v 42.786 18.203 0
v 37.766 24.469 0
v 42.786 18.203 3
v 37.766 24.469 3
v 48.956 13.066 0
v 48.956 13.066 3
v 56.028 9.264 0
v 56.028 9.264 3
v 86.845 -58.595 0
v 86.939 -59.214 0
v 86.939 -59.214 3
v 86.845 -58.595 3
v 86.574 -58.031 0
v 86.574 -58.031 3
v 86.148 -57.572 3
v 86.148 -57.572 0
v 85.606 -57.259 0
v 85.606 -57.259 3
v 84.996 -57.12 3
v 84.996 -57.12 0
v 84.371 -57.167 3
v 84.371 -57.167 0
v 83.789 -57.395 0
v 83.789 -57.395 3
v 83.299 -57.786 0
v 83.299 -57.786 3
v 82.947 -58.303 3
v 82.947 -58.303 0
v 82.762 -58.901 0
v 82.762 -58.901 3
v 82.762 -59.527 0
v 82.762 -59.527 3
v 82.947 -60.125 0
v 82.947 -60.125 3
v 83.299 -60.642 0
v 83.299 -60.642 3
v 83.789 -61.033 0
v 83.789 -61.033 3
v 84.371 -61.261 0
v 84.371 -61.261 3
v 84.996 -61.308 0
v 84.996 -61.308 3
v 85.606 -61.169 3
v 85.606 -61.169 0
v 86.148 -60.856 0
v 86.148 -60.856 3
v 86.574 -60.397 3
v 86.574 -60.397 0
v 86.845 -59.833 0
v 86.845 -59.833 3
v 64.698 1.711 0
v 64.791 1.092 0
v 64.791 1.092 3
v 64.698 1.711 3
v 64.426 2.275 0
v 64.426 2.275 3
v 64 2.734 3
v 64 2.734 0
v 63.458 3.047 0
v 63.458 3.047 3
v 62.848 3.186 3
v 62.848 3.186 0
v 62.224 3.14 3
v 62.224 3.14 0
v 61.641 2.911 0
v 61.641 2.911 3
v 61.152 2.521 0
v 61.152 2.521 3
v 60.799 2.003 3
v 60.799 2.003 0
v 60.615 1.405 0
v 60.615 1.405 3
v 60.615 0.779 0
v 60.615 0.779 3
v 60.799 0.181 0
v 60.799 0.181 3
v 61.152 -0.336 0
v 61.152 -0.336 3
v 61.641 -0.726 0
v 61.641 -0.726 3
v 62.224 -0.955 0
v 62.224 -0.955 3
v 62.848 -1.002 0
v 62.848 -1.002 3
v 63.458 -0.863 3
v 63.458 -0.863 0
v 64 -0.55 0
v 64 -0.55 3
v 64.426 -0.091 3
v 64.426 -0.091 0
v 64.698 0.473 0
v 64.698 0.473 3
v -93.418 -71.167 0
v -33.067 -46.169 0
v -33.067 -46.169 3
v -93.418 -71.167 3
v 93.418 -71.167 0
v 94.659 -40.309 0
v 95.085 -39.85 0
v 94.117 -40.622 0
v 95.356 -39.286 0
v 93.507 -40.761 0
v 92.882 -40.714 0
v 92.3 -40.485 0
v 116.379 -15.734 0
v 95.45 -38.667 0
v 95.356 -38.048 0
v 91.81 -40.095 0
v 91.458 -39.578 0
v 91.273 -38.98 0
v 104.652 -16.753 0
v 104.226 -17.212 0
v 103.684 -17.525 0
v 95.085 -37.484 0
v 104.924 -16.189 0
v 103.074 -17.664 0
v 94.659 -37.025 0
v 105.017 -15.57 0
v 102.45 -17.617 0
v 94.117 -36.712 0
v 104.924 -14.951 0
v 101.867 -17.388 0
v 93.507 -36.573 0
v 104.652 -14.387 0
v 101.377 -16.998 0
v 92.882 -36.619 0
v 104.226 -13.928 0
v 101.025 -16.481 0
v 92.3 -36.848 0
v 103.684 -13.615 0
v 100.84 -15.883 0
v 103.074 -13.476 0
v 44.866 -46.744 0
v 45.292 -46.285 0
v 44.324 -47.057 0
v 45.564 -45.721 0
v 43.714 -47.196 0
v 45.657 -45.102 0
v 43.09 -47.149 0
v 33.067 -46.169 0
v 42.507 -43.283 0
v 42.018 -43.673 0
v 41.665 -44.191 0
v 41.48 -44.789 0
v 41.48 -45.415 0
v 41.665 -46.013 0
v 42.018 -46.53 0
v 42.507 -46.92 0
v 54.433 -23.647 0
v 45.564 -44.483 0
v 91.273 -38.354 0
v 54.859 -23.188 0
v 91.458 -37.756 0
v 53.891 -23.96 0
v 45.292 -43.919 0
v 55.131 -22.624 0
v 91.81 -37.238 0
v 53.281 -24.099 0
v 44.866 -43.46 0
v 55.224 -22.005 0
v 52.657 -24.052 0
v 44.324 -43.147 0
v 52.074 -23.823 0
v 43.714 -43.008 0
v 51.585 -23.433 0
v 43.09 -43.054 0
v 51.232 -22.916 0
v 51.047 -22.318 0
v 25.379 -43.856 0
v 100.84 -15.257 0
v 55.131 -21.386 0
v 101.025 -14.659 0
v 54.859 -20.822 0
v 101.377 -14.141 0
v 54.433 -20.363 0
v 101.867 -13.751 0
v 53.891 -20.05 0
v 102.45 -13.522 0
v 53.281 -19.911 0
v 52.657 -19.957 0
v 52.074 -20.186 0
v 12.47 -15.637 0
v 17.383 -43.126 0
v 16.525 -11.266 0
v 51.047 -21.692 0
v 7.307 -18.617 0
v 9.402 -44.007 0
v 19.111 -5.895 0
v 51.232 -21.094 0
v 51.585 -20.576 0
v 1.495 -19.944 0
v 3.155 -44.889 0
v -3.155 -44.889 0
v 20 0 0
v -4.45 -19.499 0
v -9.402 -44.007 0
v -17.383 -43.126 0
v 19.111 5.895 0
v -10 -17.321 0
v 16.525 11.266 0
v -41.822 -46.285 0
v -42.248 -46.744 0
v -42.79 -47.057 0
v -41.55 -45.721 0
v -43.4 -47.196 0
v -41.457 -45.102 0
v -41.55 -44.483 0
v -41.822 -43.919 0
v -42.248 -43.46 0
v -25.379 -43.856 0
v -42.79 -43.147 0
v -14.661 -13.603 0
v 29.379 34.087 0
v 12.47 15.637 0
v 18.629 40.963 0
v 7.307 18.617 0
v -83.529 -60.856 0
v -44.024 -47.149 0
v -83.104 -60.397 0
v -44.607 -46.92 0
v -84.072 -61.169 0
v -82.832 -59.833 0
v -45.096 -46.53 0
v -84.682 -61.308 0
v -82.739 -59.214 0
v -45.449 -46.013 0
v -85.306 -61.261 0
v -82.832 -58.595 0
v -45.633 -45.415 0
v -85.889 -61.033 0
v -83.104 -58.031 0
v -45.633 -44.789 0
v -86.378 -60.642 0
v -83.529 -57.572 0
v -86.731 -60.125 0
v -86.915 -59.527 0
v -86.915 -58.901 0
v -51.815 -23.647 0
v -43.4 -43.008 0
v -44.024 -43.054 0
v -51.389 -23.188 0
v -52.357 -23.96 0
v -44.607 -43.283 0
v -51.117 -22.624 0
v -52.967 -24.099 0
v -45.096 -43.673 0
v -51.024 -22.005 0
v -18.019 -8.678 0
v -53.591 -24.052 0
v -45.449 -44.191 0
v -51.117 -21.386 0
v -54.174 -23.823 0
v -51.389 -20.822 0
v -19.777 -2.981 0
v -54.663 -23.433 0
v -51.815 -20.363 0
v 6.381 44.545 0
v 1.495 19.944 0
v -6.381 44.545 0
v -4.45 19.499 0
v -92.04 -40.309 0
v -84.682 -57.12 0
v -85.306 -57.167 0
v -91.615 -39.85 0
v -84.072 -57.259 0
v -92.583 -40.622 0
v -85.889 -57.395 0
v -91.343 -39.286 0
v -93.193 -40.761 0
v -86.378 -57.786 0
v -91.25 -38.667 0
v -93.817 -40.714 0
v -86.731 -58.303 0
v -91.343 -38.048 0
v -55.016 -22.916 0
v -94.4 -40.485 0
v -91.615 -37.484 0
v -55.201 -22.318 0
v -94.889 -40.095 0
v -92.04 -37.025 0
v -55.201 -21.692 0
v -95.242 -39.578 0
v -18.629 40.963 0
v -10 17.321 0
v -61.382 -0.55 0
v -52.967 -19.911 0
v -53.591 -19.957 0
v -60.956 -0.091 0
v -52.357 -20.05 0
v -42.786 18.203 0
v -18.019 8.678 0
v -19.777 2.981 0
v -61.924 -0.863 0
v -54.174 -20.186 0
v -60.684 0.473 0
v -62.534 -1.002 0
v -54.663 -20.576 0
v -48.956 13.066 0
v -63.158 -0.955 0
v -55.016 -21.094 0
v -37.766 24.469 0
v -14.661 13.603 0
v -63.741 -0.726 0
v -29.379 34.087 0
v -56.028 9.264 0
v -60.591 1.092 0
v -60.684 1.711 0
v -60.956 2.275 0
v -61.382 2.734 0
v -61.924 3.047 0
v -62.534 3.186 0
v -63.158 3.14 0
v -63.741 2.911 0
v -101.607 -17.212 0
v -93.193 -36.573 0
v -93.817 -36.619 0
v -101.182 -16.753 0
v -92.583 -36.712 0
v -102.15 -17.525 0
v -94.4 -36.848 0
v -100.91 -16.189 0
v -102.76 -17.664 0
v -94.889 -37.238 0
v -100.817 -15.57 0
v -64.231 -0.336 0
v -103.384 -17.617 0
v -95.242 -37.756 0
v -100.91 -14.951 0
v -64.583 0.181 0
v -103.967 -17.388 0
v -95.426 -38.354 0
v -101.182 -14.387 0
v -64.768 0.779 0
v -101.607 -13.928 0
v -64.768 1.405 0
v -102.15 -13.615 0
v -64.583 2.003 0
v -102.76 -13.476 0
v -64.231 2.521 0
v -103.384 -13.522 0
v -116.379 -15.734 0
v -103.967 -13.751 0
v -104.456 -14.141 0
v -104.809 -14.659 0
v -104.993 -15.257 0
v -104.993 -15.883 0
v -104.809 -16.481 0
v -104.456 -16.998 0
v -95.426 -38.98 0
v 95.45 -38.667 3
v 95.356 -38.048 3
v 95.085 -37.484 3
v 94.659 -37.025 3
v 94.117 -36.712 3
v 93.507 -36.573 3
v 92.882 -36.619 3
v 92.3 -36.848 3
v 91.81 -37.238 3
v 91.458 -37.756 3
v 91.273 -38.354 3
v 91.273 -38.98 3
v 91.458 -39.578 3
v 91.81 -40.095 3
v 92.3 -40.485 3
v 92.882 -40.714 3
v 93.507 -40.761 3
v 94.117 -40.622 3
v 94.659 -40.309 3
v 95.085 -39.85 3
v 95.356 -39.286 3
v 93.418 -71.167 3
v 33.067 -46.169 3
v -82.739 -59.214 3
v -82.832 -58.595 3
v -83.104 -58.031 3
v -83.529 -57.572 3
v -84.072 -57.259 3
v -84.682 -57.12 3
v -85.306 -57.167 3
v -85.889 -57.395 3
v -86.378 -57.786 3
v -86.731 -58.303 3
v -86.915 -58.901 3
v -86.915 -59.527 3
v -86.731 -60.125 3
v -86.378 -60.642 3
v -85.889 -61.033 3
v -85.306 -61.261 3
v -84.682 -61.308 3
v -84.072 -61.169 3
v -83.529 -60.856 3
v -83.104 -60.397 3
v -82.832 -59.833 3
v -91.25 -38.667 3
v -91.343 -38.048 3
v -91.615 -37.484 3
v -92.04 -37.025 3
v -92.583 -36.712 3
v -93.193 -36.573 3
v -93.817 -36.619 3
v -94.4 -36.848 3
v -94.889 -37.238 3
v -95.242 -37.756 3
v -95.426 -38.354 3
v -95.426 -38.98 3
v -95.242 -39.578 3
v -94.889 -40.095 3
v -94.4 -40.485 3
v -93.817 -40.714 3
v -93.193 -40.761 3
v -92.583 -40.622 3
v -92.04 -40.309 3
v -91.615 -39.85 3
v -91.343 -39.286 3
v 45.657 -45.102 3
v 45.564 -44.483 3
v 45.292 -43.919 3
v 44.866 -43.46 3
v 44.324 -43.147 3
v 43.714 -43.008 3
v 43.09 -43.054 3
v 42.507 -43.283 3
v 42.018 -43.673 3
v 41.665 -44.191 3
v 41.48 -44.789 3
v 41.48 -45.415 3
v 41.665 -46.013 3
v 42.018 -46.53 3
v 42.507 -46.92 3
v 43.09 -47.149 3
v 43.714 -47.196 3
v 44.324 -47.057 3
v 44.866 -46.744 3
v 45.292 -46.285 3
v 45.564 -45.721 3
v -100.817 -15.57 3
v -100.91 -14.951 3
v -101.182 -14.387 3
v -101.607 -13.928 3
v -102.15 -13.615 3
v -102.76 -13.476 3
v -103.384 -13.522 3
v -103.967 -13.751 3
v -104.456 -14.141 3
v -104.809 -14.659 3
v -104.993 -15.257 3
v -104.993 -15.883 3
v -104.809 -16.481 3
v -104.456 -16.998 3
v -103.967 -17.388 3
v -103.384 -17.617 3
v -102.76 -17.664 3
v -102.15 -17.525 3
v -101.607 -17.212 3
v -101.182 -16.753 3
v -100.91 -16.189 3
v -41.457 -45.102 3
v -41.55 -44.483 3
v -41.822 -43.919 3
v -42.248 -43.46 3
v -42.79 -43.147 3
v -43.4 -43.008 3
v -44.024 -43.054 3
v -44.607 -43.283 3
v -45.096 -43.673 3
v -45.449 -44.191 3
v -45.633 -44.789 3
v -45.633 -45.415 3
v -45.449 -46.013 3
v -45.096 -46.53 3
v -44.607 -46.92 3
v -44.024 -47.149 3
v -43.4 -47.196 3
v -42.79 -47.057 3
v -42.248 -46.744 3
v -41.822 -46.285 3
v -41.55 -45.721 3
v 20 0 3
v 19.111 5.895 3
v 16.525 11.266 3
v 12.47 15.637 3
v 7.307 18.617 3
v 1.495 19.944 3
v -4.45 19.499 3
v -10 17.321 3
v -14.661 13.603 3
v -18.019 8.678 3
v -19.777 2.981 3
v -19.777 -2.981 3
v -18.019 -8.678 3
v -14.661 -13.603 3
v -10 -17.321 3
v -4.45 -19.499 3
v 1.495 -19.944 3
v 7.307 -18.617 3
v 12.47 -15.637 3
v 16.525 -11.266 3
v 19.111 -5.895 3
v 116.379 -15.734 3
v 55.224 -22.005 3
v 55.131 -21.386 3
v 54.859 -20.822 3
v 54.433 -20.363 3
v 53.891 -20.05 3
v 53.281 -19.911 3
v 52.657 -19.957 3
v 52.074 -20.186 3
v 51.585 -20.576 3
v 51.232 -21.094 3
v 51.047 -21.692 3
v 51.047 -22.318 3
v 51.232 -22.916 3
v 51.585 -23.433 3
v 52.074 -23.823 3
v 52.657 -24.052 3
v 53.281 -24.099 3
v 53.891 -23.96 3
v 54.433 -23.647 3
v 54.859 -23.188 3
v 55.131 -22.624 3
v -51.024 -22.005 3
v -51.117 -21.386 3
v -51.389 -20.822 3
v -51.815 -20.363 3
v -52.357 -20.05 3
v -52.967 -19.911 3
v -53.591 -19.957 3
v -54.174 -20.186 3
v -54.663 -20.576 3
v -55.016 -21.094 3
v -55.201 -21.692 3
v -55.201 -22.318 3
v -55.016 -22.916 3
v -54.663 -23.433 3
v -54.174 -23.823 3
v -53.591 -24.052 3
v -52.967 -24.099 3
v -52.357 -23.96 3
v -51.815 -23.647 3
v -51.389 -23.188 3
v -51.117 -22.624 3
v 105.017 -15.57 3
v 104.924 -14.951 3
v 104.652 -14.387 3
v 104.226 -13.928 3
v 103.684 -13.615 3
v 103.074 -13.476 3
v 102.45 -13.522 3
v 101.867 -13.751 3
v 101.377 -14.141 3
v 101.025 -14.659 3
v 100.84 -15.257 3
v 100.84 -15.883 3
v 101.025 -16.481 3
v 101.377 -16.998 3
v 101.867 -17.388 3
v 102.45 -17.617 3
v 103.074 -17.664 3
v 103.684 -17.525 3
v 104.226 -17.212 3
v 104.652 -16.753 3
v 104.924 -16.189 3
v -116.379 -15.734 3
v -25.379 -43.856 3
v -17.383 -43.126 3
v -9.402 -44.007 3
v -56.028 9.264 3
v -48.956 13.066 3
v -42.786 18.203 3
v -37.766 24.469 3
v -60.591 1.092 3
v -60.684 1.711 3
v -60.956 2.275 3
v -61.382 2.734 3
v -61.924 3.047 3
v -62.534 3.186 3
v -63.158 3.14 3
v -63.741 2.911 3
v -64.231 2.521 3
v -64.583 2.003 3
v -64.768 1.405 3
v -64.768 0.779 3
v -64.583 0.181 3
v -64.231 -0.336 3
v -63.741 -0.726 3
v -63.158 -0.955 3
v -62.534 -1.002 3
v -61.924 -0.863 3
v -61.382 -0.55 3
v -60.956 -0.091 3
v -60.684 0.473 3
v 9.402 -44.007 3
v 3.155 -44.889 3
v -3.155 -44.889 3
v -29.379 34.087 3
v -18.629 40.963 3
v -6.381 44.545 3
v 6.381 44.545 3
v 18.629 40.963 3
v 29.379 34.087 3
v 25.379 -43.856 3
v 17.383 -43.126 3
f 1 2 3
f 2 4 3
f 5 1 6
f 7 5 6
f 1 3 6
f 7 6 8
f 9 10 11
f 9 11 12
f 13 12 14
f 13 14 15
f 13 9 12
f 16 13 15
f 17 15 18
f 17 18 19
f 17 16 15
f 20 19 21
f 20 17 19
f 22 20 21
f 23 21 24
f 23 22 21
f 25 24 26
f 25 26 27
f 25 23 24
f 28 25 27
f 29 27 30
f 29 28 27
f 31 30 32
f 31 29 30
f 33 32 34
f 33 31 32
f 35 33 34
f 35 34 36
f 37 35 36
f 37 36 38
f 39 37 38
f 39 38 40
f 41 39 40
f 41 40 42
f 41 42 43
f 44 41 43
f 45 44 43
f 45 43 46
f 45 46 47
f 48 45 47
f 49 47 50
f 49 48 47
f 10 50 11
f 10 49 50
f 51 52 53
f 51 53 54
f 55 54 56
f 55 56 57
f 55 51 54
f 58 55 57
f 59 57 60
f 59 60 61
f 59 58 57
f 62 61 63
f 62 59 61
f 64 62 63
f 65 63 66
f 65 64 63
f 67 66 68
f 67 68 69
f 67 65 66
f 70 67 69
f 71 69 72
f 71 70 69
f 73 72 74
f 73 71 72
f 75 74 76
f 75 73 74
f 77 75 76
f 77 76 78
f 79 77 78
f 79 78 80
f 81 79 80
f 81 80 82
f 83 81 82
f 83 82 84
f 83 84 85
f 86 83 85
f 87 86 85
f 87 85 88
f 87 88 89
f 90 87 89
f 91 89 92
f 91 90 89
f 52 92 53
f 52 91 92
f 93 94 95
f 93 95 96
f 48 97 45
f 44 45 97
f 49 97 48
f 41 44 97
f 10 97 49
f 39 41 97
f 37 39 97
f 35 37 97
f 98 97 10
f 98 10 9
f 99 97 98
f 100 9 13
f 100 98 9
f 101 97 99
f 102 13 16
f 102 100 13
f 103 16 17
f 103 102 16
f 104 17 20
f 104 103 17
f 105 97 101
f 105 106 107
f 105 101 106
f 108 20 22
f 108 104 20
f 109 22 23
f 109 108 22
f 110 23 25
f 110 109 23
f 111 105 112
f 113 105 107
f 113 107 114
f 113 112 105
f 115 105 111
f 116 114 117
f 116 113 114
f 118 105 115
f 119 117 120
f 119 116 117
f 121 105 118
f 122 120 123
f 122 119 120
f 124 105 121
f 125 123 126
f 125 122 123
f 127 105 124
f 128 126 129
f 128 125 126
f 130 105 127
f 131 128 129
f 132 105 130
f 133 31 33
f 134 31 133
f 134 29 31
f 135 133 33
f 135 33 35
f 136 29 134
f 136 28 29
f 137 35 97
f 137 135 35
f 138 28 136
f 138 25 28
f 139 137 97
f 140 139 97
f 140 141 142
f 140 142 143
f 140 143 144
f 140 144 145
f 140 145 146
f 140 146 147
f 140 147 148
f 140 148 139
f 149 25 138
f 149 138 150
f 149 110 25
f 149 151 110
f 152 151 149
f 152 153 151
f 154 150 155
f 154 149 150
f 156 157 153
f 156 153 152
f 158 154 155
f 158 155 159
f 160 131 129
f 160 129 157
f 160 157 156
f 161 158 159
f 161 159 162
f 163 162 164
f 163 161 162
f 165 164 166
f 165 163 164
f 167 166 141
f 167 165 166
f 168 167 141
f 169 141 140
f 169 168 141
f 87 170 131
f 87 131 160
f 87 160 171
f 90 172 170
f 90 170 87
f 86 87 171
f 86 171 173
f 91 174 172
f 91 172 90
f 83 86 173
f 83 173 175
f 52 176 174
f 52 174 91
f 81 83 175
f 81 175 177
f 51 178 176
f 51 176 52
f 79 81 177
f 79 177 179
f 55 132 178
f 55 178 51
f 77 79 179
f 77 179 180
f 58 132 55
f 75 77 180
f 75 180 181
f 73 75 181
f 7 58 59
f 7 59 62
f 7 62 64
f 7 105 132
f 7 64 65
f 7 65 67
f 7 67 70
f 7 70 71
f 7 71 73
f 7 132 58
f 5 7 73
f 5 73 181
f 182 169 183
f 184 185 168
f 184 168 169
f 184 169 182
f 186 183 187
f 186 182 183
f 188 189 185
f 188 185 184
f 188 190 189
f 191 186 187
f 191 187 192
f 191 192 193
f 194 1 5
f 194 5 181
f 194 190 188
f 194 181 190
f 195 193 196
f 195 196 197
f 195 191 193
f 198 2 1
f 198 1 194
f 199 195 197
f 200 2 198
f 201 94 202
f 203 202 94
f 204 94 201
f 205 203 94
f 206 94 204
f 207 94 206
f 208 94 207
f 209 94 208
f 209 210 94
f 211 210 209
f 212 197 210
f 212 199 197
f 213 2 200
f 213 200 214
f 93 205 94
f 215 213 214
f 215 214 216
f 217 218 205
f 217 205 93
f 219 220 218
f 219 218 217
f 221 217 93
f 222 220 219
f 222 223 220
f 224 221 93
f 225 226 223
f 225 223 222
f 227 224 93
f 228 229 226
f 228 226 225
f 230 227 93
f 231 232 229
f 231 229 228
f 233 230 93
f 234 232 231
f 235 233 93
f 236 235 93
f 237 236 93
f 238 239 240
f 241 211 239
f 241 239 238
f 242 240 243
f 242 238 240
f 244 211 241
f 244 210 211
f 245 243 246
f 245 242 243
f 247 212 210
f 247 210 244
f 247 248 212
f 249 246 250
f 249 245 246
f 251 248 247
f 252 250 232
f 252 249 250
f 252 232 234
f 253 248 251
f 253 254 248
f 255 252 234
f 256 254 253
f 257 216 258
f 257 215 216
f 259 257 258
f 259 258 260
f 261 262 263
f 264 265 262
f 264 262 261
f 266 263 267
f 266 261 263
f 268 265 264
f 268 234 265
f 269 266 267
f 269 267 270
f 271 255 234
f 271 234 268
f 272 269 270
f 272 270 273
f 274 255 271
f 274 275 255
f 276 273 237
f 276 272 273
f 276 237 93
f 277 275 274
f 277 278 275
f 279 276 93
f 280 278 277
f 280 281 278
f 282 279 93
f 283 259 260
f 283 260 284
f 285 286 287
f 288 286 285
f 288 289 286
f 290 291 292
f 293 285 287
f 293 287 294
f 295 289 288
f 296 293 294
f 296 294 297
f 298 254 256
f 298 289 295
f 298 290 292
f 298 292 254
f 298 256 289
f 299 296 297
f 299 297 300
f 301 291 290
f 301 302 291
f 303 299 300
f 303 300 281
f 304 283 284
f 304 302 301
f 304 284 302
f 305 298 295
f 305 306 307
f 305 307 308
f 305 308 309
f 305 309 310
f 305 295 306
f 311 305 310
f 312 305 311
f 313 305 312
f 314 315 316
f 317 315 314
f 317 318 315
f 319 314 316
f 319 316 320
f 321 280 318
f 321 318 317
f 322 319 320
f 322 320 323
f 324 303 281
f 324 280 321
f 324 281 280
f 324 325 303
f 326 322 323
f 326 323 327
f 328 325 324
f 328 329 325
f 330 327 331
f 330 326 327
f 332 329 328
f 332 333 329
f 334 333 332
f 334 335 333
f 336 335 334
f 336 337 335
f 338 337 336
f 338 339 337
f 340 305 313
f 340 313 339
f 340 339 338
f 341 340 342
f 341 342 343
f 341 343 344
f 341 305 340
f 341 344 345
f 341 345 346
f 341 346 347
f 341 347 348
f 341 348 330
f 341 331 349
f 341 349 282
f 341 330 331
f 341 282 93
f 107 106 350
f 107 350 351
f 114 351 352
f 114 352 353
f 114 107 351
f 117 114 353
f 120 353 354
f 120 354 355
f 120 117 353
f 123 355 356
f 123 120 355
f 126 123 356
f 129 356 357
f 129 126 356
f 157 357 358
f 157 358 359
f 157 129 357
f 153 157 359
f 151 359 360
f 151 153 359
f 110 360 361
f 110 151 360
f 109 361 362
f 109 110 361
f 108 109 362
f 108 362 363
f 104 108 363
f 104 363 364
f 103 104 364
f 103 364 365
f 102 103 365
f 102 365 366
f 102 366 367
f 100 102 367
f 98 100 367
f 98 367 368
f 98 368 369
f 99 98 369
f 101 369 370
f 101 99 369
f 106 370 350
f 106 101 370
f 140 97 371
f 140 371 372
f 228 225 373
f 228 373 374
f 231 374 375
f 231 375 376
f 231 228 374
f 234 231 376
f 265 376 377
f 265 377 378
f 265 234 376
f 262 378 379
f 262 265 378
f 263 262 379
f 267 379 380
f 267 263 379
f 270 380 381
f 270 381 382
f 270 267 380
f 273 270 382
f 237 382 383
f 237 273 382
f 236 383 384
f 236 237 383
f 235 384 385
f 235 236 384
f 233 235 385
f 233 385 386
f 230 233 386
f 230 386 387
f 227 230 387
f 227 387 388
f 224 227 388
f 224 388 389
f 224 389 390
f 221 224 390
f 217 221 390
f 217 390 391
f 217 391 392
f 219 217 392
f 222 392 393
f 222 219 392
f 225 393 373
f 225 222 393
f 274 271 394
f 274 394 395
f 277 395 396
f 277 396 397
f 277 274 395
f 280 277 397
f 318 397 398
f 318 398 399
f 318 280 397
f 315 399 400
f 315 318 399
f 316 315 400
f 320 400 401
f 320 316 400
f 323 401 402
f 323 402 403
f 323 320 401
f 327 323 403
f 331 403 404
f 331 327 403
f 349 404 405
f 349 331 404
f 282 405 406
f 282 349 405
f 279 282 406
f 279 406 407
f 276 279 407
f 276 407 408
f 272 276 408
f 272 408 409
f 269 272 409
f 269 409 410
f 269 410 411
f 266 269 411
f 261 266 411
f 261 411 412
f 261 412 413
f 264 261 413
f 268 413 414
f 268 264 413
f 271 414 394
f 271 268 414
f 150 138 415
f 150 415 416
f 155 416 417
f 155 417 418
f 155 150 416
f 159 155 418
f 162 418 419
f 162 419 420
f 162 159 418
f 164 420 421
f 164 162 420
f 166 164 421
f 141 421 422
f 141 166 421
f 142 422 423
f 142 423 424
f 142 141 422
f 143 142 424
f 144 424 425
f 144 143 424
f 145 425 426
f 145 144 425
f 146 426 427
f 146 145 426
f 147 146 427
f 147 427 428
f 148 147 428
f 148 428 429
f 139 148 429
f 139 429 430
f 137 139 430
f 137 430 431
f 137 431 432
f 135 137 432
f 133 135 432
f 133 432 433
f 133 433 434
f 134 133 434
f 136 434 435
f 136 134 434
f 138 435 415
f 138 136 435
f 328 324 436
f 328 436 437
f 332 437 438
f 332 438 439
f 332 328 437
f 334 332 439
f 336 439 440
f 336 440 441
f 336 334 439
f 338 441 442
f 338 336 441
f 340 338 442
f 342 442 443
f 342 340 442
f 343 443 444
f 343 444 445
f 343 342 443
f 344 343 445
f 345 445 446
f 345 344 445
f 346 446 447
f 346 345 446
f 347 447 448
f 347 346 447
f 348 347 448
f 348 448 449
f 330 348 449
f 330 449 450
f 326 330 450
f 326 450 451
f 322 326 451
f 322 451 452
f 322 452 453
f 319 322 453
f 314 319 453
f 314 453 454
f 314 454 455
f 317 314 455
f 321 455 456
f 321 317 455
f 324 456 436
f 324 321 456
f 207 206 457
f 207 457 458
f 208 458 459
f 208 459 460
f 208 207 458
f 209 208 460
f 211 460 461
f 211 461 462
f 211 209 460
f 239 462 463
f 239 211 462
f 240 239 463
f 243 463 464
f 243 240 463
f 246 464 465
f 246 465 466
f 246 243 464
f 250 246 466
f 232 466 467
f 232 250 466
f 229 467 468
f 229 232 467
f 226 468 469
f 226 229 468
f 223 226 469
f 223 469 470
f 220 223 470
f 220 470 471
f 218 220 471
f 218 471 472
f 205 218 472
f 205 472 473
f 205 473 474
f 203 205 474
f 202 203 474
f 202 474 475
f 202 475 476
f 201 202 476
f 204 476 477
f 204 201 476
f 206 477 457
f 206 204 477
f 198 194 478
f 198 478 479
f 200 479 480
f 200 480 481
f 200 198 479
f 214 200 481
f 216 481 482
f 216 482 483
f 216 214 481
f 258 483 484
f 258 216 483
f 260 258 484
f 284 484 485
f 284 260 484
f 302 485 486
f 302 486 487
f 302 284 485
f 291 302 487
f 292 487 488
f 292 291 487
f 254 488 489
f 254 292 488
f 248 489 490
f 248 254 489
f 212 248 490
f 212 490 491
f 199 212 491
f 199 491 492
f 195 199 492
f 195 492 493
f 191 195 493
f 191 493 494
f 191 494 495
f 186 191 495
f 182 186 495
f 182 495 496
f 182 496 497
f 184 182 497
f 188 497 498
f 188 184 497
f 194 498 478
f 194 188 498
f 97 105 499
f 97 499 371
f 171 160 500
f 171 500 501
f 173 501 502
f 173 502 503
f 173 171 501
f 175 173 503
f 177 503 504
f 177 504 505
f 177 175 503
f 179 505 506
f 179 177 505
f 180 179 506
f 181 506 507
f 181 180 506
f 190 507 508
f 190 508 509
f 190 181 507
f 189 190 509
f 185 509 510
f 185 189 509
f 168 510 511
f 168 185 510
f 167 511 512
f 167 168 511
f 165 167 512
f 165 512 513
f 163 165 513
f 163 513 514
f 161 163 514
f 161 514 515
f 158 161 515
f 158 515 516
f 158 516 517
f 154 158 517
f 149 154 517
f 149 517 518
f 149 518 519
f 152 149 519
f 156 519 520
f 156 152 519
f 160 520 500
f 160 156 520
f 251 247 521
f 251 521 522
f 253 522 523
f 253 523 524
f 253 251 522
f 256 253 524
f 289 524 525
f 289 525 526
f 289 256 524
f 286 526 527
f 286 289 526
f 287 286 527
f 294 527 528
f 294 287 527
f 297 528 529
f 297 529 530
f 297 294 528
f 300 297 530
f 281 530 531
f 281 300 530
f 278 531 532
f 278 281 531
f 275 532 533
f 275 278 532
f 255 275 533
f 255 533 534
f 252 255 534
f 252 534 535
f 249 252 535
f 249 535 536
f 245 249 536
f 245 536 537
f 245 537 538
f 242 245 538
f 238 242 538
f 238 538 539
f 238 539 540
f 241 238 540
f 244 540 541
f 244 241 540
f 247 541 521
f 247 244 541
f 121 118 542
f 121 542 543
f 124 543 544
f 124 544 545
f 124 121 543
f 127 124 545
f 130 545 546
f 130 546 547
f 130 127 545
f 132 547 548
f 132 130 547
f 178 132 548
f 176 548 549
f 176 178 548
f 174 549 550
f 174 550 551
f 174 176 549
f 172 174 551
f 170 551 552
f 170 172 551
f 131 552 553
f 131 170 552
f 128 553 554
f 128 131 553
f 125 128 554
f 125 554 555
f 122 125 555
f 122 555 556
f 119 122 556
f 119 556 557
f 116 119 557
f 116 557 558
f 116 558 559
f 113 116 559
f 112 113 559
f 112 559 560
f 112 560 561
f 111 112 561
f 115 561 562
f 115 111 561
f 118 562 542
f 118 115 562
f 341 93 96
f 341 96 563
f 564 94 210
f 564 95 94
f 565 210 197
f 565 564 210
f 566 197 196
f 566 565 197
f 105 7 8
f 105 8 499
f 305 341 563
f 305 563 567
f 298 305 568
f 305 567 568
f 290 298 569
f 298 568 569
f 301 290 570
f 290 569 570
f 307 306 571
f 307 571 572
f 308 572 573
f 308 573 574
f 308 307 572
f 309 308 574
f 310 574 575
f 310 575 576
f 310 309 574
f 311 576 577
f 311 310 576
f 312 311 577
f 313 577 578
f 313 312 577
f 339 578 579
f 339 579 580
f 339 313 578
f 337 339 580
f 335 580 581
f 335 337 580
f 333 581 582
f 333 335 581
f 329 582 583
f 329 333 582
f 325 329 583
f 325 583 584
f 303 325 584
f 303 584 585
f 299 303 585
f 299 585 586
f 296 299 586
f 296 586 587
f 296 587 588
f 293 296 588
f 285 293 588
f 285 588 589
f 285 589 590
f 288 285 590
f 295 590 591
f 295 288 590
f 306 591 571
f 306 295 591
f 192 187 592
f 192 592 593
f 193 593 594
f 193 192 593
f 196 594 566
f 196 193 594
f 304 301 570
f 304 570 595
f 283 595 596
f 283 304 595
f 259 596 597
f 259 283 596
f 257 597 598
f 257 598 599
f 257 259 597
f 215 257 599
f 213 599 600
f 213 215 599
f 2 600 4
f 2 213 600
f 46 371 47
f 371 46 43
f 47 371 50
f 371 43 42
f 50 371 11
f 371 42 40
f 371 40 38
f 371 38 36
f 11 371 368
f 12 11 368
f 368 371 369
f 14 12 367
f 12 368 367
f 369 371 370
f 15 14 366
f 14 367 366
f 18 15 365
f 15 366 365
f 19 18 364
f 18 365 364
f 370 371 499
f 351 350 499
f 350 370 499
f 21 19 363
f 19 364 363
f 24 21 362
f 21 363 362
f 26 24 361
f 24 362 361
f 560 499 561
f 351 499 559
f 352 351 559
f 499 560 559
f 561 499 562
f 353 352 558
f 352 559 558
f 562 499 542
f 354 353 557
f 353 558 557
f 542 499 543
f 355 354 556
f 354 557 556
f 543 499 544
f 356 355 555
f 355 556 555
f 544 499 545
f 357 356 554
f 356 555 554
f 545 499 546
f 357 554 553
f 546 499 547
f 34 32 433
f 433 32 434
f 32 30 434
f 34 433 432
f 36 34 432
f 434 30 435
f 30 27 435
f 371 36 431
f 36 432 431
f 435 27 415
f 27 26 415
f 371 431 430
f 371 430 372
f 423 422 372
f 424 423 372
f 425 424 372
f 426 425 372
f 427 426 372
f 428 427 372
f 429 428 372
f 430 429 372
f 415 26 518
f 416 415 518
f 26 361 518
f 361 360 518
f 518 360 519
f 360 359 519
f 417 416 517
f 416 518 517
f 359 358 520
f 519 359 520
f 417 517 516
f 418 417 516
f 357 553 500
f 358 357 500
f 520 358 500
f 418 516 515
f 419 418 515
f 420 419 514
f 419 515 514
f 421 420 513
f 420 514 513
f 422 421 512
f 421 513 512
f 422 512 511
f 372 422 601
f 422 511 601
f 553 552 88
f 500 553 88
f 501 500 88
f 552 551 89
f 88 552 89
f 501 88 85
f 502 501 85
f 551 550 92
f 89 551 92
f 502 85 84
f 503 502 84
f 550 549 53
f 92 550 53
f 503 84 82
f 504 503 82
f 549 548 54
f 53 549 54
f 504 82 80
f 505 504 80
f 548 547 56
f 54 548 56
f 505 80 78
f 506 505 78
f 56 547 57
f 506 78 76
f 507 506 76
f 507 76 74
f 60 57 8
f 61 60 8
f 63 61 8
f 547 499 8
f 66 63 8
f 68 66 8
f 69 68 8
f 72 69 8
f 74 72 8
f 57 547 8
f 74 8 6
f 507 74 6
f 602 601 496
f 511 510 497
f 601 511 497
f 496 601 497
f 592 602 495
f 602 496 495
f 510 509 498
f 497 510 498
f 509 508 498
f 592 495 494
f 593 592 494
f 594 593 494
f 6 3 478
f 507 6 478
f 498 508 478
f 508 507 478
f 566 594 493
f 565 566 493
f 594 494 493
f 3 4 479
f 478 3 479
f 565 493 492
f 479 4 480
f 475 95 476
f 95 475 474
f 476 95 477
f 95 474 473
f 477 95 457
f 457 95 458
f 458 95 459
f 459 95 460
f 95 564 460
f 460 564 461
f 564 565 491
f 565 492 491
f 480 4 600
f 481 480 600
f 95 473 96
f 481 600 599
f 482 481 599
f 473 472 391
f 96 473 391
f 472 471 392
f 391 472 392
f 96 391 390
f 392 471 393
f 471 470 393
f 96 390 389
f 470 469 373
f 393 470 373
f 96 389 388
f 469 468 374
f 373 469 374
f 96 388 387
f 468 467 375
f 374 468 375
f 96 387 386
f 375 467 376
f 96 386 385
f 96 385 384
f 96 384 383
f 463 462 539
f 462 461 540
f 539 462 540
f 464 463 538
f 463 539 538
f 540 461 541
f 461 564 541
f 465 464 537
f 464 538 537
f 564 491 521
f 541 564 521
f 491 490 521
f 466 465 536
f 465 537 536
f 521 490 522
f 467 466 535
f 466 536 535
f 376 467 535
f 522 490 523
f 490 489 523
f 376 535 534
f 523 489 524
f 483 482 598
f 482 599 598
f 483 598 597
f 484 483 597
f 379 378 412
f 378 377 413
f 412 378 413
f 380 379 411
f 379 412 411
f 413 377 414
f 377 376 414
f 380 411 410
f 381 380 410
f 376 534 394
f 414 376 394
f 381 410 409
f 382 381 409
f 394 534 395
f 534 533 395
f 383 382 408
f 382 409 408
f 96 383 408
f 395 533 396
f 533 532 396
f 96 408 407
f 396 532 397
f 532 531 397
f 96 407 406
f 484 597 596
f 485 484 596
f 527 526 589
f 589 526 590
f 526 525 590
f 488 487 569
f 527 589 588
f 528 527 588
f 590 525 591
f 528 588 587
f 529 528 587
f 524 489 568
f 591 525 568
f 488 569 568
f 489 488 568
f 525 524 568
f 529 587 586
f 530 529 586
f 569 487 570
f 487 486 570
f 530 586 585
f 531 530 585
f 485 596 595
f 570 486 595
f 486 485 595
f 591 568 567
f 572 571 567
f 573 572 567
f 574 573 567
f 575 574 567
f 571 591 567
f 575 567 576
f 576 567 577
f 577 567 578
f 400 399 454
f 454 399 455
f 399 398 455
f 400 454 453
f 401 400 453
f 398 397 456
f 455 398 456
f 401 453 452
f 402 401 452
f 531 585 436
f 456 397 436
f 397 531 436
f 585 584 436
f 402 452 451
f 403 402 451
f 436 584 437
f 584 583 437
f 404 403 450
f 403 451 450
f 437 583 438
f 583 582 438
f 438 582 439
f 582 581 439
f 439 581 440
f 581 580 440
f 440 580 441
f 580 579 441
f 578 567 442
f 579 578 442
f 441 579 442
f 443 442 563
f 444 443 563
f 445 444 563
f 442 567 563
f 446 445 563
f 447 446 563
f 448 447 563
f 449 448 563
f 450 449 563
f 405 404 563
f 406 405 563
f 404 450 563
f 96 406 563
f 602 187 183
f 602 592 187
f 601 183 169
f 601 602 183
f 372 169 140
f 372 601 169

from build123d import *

# Parameters (mm, degrees)
SKETCH1_R           = 20
SKETCH1_R_2         = 2.1
BOSS_EXTRUDE1_DEPTH = 3
FILLET1_R           = 40


with BuildPart() as part:
    # Sketch1 → Boss-Extrude1 (new body)
    with BuildSketch(Plane.XY):
        with BuildLine():
            Line((-93.417721196, -71.166653094), (-116.378727138, -15.733881143))
            Line((-116.378727138, -15.733881143), (-42.468364537, 14.880793446))
            ThreePointArc((-42.468364537, 14.880793446), (0, 45), (42.468364537, 14.880793446))
            Line((42.468364537, 14.880793446), (116.378727138, -15.733881143))
            Line((116.378727138, -15.733881143), (93.417721196, -71.166653094))
            Line((93.417721196, -71.166653094), (19.507358595, -40.551978505))
            ThreePointArc((19.507358595, -40.551978505), (0, -45), (-19.507358595, -40.551978505))
            Line((-19.507358595, -40.551978505), (-93.417721196, -71.166653094))
        make_face()
        Circle(SKETCH1_R, mode=Mode.SUBTRACT)
        with Locations((-93.34973001, -38.666724214)):
            Circle(SKETCH1_R_2, mode=Mode.SUBTRACT)
        with Locations((-102.916815819, -15.569735901)):
            Circle(SKETCH1_R_2, mode=Mode.SUBTRACT)
        with Locations((-84.838757104, -59.214030433)):
            Circle(SKETCH1_R_2, mode=Mode.SUBTRACT)
        with Locations((84.838757104, -59.214030433)):
            Circle(SKETCH1_R_2, mode=Mode.SUBTRACT)
        with Locations((93.34973001, -38.666724214)):
            Circle(SKETCH1_R_2, mode=Mode.SUBTRACT)
        with Locations((102.916815819, -15.569735901)):
            Circle(SKETCH1_R_2, mode=Mode.SUBTRACT)
        with Locations((-62.691100974, 1.092300744)):
            Circle(SKETCH1_R_2, mode=Mode.SUBTRACT)
        with Locations((-53.124015165, -22.004687569)):
            Circle(SKETCH1_R_2, mode=Mode.SUBTRACT)
        with Locations((-43.556929356, -45.101675882)):
            Circle(SKETCH1_R_2, mode=Mode.SUBTRACT)
        with Locations((43.556929356, -45.101675882)):
            Circle(SKETCH1_R_2, mode=Mode.SUBTRACT)
        with Locations((53.124015165, -22.004687569)):
            Circle(SKETCH1_R_2, mode=Mode.SUBTRACT)
        with Locations((62.691100974, 1.092300744)):
            Circle(SKETCH1_R_2, mode=Mode.SUBTRACT)
    extrude(amount=BOSS_EXTRUDE1_DEPTH)

    # Fillet1
    fillet1_edges = [part.edges().sort_by_distance(p)[0] for p in [
        (-19.507358595, -40.551978505, 1.5),
        (-42.468364537, 14.880793446, 1.5),
        (42.468364537, 14.880793446, 1.5),
        (19.507358595, -40.551978505, 1.5),
    ]]
    fillet(fillet1_edges, radius=FILLET1_R)


solid = part.part
